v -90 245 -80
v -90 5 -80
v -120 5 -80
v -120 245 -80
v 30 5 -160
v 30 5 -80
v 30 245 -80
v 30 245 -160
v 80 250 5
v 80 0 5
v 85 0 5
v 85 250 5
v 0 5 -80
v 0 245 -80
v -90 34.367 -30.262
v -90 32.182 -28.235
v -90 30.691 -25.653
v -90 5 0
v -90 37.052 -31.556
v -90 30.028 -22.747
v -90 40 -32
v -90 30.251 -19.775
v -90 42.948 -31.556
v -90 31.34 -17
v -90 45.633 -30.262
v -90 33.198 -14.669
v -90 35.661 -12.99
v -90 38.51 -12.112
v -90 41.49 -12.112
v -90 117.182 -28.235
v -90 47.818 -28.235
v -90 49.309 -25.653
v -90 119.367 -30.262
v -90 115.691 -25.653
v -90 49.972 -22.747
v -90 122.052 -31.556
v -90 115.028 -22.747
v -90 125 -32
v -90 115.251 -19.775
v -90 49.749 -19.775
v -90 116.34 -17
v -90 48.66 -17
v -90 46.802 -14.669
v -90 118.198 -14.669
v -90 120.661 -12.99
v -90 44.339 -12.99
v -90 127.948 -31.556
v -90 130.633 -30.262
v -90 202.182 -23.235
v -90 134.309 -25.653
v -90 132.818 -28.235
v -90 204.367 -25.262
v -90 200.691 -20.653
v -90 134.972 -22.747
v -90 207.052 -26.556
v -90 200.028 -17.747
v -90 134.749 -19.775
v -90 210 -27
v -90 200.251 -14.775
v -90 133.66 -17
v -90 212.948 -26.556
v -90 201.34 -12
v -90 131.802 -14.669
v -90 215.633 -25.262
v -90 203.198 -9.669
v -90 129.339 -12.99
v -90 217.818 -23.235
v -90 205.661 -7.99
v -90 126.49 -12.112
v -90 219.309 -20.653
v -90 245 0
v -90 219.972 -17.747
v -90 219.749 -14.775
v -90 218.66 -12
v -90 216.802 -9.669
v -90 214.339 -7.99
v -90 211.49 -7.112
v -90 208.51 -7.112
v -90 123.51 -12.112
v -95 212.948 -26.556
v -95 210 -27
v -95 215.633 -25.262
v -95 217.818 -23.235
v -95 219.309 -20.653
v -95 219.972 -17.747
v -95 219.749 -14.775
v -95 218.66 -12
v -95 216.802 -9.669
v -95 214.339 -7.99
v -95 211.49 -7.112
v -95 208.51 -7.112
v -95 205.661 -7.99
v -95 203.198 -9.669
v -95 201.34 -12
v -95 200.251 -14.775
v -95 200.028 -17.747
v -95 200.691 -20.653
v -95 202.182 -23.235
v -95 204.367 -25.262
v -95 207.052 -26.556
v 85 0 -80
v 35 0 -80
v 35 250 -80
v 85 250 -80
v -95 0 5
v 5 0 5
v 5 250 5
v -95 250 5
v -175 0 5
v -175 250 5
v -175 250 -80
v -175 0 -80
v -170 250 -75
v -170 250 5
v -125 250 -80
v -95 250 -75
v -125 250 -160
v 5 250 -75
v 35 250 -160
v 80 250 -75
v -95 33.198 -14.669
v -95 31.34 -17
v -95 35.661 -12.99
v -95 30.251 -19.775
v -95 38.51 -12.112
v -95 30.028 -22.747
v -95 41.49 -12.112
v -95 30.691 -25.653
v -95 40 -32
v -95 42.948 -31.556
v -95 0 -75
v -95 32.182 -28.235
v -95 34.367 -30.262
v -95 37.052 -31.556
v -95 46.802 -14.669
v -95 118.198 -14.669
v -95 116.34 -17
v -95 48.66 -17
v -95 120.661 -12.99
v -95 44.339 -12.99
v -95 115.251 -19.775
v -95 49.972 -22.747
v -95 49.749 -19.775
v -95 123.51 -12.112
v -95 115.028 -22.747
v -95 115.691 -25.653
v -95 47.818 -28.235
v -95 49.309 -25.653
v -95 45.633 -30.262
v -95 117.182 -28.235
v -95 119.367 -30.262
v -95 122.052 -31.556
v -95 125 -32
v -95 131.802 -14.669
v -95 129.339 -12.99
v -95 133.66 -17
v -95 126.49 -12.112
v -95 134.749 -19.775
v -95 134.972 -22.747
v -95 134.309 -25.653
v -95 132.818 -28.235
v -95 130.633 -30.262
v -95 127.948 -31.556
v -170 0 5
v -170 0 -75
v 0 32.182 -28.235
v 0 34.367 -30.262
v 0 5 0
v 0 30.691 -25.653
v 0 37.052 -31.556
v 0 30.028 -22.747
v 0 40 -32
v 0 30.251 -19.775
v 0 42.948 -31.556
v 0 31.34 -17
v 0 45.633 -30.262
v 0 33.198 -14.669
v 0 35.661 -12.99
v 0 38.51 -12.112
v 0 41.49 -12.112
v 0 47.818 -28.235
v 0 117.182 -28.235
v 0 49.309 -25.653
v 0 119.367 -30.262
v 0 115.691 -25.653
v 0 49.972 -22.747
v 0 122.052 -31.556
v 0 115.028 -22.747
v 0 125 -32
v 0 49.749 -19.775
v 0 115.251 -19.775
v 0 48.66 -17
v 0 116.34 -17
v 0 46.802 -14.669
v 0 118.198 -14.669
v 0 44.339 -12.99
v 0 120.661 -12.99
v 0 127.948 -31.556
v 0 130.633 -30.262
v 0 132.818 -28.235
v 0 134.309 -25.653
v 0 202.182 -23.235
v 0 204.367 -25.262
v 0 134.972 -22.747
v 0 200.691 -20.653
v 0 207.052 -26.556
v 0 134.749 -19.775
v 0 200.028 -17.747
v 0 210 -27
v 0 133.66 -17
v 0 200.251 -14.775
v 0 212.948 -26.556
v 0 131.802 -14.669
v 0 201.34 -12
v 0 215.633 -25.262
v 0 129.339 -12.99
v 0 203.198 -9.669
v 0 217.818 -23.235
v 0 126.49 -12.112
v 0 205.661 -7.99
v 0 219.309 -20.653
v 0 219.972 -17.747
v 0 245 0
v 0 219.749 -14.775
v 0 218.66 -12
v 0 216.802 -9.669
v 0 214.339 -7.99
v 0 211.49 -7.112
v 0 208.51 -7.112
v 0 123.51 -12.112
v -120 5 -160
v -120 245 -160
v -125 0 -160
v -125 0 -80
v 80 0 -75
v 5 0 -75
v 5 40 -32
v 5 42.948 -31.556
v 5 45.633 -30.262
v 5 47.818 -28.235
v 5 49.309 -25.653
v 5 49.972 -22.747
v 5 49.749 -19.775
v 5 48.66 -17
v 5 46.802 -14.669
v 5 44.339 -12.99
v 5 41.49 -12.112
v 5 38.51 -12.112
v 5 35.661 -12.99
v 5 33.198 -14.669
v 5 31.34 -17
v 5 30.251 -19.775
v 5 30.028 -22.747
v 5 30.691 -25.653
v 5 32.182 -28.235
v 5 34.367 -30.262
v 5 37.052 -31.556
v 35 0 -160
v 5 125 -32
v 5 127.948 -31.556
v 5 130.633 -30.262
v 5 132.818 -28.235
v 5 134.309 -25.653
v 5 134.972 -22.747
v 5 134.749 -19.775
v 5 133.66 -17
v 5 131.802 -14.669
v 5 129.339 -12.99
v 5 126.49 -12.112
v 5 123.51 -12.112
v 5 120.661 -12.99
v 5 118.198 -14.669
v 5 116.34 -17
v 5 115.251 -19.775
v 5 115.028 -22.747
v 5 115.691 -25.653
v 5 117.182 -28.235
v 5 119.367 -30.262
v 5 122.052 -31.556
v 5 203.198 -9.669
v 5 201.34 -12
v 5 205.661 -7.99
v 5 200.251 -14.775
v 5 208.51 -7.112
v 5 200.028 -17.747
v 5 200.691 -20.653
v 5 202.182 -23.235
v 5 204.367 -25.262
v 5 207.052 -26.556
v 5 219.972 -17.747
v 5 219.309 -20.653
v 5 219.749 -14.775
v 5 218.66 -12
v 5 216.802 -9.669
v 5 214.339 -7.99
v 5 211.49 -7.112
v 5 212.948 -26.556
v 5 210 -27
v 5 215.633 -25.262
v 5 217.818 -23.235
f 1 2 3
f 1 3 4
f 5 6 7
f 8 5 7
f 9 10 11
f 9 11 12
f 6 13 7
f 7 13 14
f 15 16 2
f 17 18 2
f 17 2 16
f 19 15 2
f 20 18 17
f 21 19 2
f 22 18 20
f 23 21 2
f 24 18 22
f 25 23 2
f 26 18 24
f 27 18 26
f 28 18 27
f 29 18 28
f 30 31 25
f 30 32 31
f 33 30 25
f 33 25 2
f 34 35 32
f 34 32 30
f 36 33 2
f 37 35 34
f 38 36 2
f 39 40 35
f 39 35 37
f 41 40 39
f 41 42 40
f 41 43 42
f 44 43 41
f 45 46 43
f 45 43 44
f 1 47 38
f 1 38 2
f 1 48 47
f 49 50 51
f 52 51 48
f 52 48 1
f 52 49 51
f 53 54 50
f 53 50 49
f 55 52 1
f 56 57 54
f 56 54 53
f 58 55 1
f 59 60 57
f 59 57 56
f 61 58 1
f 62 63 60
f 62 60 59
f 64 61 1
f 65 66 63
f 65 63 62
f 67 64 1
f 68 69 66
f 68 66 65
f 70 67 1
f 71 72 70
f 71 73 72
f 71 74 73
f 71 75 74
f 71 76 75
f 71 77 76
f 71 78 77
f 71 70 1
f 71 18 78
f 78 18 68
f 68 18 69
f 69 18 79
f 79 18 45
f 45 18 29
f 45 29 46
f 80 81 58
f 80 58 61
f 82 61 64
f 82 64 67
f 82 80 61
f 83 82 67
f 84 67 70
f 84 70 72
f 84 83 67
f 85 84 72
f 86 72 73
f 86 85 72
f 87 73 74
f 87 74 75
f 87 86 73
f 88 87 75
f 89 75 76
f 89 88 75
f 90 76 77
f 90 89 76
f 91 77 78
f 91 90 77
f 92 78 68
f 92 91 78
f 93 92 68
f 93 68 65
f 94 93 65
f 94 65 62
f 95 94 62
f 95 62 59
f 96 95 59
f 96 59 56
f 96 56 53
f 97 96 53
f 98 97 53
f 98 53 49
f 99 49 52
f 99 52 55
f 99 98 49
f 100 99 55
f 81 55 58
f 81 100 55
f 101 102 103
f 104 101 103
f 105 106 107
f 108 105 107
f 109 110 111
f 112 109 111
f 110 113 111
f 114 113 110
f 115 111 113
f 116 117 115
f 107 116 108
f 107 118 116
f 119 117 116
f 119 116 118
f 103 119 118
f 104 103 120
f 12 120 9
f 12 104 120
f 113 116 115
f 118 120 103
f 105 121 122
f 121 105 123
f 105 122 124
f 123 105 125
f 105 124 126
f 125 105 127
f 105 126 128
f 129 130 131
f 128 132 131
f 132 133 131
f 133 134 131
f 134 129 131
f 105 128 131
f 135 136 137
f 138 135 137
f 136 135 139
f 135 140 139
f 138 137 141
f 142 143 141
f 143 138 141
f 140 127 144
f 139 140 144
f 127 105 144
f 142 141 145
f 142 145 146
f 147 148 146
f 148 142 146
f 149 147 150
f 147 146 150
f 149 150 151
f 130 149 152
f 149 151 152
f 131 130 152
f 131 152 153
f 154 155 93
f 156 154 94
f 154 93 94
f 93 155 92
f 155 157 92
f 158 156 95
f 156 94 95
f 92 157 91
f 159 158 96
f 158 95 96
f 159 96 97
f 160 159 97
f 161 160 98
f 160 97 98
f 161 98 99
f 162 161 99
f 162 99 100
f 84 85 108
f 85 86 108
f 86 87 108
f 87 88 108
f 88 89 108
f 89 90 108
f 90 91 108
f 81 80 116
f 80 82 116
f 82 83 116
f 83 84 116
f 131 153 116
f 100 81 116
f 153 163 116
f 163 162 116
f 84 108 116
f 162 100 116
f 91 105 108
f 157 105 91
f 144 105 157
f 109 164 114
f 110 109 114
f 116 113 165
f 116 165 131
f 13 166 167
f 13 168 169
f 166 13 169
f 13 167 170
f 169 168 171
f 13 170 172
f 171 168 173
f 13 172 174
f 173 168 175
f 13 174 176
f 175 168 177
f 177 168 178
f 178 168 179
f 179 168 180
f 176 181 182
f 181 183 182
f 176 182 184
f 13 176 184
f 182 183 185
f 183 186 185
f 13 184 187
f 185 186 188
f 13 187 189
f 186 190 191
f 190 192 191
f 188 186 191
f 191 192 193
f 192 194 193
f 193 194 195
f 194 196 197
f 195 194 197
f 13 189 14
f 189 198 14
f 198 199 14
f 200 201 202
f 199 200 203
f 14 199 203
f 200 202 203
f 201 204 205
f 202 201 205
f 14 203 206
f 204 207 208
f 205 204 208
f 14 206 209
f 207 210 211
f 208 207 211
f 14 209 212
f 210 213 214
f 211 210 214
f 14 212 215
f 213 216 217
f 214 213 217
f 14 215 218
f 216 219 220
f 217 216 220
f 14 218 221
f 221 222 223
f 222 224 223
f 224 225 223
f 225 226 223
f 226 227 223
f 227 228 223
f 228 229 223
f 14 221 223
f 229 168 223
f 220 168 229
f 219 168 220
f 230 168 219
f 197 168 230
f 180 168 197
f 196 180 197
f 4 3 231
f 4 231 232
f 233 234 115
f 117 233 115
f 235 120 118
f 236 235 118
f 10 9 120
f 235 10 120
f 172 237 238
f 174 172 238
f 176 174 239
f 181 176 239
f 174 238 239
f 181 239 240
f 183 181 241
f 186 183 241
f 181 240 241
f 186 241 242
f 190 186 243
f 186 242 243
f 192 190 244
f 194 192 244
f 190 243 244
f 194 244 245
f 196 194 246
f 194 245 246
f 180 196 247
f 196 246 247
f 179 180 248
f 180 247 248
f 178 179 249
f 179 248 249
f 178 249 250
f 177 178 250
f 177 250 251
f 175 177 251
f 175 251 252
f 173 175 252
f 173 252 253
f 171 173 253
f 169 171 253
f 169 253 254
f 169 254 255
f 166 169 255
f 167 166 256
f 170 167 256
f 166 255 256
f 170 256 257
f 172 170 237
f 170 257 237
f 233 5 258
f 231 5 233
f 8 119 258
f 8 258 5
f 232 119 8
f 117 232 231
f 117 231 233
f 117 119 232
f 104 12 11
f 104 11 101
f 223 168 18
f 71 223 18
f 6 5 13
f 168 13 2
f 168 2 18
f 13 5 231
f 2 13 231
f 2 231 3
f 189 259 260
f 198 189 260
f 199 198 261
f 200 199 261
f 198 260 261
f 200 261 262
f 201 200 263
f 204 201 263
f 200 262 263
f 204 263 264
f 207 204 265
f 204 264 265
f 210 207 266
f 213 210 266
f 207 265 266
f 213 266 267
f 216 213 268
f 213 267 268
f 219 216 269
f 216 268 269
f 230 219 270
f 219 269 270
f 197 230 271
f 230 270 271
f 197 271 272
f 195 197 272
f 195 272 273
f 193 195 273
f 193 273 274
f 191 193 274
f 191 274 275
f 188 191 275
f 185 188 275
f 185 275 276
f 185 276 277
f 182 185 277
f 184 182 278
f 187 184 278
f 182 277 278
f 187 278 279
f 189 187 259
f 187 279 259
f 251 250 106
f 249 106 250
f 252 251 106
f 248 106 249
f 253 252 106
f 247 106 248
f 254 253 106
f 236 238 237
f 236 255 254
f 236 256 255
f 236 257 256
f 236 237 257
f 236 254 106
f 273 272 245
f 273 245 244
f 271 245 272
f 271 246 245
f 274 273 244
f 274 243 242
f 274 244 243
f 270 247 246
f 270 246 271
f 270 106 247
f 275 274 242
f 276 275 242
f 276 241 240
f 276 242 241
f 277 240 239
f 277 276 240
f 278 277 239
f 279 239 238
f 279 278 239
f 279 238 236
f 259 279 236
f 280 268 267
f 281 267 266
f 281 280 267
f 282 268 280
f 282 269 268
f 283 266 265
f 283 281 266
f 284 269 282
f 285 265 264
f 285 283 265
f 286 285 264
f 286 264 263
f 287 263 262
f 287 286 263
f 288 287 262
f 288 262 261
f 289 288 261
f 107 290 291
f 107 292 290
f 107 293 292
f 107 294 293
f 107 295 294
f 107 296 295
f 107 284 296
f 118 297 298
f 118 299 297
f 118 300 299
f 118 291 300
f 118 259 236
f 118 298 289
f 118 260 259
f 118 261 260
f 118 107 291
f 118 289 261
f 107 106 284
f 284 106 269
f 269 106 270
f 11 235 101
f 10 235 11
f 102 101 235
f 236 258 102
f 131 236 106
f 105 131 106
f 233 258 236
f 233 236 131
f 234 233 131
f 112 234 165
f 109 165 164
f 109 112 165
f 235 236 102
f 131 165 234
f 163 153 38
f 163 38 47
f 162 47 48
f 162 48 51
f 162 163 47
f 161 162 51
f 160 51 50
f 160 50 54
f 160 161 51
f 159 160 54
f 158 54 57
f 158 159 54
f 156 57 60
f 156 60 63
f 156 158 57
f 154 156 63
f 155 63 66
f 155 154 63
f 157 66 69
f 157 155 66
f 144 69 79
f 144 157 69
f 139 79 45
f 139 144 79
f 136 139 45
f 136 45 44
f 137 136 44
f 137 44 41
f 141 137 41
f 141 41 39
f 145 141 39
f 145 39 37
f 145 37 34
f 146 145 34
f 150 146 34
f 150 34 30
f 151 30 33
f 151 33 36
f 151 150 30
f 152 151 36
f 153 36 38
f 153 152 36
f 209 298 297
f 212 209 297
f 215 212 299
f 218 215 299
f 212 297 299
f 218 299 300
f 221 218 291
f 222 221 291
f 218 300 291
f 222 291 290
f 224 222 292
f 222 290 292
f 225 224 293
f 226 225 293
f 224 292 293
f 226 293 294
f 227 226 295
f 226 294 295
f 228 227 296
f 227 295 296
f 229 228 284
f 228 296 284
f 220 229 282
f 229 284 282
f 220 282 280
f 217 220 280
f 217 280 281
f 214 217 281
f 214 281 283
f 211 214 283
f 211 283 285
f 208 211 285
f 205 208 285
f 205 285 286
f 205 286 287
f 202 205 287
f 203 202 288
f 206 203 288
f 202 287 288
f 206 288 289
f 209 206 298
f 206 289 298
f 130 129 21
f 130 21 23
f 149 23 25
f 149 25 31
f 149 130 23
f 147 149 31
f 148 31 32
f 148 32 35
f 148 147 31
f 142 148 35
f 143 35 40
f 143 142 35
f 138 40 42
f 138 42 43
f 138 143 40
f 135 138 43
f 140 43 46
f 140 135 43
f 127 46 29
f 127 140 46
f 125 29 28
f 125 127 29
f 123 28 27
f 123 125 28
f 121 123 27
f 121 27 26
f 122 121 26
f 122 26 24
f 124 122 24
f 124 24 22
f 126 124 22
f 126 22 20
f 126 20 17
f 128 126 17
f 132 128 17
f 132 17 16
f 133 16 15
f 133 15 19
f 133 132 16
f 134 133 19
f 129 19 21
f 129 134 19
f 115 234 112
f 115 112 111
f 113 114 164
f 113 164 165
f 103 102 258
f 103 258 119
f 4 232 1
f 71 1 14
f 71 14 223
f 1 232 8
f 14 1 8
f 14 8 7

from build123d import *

# Parameters (mm, degrees)
ESQUISSE1_W             = 45
ESQUISSE1_H             = 250
BOSS_EXTRU_1_DEPTH      = 5
ESQUISSE2_W             = 80
ESQUISSE2_H             = 250
BOSS_EXTRU_2_DEPTH      = 5
ESQUISSE4_W             = 80
ESQUISSE4_H             = 250
BOSS_EXTRU_4_DEPTH      = 5
ESQUISSE5_W             = 85
ESQUISSE5_H             = 250
BOSS_EXTRU_5_DEPTH      = 5
ESQUISSE6_R             = 10
ENL_V_MAT_EXTRU_1_DEPTH = 5
ESQUISSE8_W             = 5
ESQUISSE8_H             = 250
BOSS_EXTRU_6_DEPTH      = 80
BOSS_EXTRU_7_DEPTH      = 5
BOSS_EXTRU_9_DEPTH      = 5


with BuildPart() as part:
    # Esquisse1 → Boss.-Extru.1 (new body)
    with BuildSketch(Plane.XY):
        with Locations((-22.5, 125)):
            Rectangle(ESQUISSE1_W, ESQUISSE1_H)
    boss_extru_1 = extrude(amount=BOSS_EXTRU_1_DEPTH)

    # Esquisse2 → Boss.-Extru.2 (add)
    with BuildSketch(Plane(origin=(0, 0, 0), x_dir=(0, 0, -1), z_dir=(1, 0, 0))):
        with Locations((35, 125)):
            Rectangle(ESQUISSE2_W, ESQUISSE2_H)
    boss_extru_2 = extrude(amount=BOSS_EXTRU_2_DEPTH)

    # Esquisse4 → Boss.-Extru.4 (add)
    with BuildSketch(Plane(origin=(0, 0, -75), x_dir=(-1, 0, 0), z_dir=(0, 0, -1))):
        with Locations((-40, 125)):
            Rectangle(ESQUISSE4_W, ESQUISSE4_H)
    boss_extru_4 = extrude(amount=BOSS_EXTRU_4_DEPTH)

    # Esquisse5 → Boss.-Extru.5 (add)
    with BuildSketch(Plane(origin=(80, 0, 0), x_dir=(0, 0, -1), z_dir=(1, 0, 0))):
        with Locations((37.5, 125)):
            Rectangle(ESQUISSE5_W, ESQUISSE5_H)
    boss_extru_5 = extrude(amount=BOSS_EXTRU_5_DEPTH)

    # Esquisse6 → Enlèv. mat.-Extru.1 (cut)
    with BuildSketch(Plane(origin=(5, 0, 0), x_dir=(0, 0, -1), z_dir=(1, 0, 0))):
        with Locations((22, 40)):
            Circle(ESQUISSE6_R)
        with Locations((22, 125)):
            Circle(ESQUISSE6_R)
        with Locations((17, 210)):
            Circle(ESQUISSE6_R)
    enl_v_mat_extru_1 = extrude(amount=-ENL_V_MAT_EXTRU_1_DEPTH, mode=Mode.SUBTRACT)

    # Esquisse8 → Boss.-Extru.6 (add)
    with BuildSketch(Plane(origin=(0, 0, -80), x_dir=(-1, 0, 0), z_dir=(0, 0, -1))):
        with Locations((-32.5, 125)):
            Rectangle(ESQUISSE8_W, ESQUISSE8_H)
    boss_extru_6 = extrude(amount=BOSS_EXTRU_6_DEPTH)

    # Symétrie2: Boss.-Extru.1, Boss.-Extru.2, Boss.-Extru.4, Boss.-Extru.5, Enlèv. mat.-Extru.1, Boss.-Extru.6 across plane
    add(boss_extru_1.mirror(Plane(origin=(-45, 0, 5), x_dir=(0, 0, 1), z_dir=(1, 0, 0))))
    add(boss_extru_2.mirror(Plane(origin=(-45, 0, 5), x_dir=(0, 0, 1), z_dir=(1, 0, 0))))
    add(boss_extru_4.mirror(Plane(origin=(-45, 0, 5), x_dir=(0, 0, 1), z_dir=(1, 0, 0))))
    add(boss_extru_5.mirror(Plane(origin=(-45, 0, 5), x_dir=(0, 0, 1), z_dir=(1, 0, 0))))
    add(enl_v_mat_extru_1.mirror(Plane(origin=(-45, 0, 5), x_dir=(0, 0, 1), z_dir=(1, 0, 0))), mode=Mode.SUBTRACT)
    add(boss_extru_6.mirror(Plane(origin=(-45, 0, 5), x_dir=(0, 0, 1), z_dir=(1, 0, 0))))

    # Esquisse3D1 → Boss.-Extru.7 (add)
    with BuildSketch(Plane(origin=(30, 0, -160), x_dir=(-0.5999999999999998, 0, 0.8000000000000003), z_dir=(0, -1, 0))):
        Polygon((0, 0), (64, -48), (82, -24), (146, -72), (200, 0), (136, 48), (154, 72), (90, 120), align=None)
    extrude(amount=-BOSS_EXTRU_7_DEPTH)

    # Esquisse3D3 → Boss.-Extru.9 (add)
    with BuildSketch(Plane(origin=(-120, 250, -160), x_dir=(0.5999999999999999, 0, 0.8), z_dir=(0, 1, 0))):
        Polygon((0, 0), (64, -48), (82, -24), (146, -72), (200, 0), (136, 48), (154, 72), (90, 120), align=None)
    extrude(amount=-BOSS_EXTRU_9_DEPTH)


solid = part.part
